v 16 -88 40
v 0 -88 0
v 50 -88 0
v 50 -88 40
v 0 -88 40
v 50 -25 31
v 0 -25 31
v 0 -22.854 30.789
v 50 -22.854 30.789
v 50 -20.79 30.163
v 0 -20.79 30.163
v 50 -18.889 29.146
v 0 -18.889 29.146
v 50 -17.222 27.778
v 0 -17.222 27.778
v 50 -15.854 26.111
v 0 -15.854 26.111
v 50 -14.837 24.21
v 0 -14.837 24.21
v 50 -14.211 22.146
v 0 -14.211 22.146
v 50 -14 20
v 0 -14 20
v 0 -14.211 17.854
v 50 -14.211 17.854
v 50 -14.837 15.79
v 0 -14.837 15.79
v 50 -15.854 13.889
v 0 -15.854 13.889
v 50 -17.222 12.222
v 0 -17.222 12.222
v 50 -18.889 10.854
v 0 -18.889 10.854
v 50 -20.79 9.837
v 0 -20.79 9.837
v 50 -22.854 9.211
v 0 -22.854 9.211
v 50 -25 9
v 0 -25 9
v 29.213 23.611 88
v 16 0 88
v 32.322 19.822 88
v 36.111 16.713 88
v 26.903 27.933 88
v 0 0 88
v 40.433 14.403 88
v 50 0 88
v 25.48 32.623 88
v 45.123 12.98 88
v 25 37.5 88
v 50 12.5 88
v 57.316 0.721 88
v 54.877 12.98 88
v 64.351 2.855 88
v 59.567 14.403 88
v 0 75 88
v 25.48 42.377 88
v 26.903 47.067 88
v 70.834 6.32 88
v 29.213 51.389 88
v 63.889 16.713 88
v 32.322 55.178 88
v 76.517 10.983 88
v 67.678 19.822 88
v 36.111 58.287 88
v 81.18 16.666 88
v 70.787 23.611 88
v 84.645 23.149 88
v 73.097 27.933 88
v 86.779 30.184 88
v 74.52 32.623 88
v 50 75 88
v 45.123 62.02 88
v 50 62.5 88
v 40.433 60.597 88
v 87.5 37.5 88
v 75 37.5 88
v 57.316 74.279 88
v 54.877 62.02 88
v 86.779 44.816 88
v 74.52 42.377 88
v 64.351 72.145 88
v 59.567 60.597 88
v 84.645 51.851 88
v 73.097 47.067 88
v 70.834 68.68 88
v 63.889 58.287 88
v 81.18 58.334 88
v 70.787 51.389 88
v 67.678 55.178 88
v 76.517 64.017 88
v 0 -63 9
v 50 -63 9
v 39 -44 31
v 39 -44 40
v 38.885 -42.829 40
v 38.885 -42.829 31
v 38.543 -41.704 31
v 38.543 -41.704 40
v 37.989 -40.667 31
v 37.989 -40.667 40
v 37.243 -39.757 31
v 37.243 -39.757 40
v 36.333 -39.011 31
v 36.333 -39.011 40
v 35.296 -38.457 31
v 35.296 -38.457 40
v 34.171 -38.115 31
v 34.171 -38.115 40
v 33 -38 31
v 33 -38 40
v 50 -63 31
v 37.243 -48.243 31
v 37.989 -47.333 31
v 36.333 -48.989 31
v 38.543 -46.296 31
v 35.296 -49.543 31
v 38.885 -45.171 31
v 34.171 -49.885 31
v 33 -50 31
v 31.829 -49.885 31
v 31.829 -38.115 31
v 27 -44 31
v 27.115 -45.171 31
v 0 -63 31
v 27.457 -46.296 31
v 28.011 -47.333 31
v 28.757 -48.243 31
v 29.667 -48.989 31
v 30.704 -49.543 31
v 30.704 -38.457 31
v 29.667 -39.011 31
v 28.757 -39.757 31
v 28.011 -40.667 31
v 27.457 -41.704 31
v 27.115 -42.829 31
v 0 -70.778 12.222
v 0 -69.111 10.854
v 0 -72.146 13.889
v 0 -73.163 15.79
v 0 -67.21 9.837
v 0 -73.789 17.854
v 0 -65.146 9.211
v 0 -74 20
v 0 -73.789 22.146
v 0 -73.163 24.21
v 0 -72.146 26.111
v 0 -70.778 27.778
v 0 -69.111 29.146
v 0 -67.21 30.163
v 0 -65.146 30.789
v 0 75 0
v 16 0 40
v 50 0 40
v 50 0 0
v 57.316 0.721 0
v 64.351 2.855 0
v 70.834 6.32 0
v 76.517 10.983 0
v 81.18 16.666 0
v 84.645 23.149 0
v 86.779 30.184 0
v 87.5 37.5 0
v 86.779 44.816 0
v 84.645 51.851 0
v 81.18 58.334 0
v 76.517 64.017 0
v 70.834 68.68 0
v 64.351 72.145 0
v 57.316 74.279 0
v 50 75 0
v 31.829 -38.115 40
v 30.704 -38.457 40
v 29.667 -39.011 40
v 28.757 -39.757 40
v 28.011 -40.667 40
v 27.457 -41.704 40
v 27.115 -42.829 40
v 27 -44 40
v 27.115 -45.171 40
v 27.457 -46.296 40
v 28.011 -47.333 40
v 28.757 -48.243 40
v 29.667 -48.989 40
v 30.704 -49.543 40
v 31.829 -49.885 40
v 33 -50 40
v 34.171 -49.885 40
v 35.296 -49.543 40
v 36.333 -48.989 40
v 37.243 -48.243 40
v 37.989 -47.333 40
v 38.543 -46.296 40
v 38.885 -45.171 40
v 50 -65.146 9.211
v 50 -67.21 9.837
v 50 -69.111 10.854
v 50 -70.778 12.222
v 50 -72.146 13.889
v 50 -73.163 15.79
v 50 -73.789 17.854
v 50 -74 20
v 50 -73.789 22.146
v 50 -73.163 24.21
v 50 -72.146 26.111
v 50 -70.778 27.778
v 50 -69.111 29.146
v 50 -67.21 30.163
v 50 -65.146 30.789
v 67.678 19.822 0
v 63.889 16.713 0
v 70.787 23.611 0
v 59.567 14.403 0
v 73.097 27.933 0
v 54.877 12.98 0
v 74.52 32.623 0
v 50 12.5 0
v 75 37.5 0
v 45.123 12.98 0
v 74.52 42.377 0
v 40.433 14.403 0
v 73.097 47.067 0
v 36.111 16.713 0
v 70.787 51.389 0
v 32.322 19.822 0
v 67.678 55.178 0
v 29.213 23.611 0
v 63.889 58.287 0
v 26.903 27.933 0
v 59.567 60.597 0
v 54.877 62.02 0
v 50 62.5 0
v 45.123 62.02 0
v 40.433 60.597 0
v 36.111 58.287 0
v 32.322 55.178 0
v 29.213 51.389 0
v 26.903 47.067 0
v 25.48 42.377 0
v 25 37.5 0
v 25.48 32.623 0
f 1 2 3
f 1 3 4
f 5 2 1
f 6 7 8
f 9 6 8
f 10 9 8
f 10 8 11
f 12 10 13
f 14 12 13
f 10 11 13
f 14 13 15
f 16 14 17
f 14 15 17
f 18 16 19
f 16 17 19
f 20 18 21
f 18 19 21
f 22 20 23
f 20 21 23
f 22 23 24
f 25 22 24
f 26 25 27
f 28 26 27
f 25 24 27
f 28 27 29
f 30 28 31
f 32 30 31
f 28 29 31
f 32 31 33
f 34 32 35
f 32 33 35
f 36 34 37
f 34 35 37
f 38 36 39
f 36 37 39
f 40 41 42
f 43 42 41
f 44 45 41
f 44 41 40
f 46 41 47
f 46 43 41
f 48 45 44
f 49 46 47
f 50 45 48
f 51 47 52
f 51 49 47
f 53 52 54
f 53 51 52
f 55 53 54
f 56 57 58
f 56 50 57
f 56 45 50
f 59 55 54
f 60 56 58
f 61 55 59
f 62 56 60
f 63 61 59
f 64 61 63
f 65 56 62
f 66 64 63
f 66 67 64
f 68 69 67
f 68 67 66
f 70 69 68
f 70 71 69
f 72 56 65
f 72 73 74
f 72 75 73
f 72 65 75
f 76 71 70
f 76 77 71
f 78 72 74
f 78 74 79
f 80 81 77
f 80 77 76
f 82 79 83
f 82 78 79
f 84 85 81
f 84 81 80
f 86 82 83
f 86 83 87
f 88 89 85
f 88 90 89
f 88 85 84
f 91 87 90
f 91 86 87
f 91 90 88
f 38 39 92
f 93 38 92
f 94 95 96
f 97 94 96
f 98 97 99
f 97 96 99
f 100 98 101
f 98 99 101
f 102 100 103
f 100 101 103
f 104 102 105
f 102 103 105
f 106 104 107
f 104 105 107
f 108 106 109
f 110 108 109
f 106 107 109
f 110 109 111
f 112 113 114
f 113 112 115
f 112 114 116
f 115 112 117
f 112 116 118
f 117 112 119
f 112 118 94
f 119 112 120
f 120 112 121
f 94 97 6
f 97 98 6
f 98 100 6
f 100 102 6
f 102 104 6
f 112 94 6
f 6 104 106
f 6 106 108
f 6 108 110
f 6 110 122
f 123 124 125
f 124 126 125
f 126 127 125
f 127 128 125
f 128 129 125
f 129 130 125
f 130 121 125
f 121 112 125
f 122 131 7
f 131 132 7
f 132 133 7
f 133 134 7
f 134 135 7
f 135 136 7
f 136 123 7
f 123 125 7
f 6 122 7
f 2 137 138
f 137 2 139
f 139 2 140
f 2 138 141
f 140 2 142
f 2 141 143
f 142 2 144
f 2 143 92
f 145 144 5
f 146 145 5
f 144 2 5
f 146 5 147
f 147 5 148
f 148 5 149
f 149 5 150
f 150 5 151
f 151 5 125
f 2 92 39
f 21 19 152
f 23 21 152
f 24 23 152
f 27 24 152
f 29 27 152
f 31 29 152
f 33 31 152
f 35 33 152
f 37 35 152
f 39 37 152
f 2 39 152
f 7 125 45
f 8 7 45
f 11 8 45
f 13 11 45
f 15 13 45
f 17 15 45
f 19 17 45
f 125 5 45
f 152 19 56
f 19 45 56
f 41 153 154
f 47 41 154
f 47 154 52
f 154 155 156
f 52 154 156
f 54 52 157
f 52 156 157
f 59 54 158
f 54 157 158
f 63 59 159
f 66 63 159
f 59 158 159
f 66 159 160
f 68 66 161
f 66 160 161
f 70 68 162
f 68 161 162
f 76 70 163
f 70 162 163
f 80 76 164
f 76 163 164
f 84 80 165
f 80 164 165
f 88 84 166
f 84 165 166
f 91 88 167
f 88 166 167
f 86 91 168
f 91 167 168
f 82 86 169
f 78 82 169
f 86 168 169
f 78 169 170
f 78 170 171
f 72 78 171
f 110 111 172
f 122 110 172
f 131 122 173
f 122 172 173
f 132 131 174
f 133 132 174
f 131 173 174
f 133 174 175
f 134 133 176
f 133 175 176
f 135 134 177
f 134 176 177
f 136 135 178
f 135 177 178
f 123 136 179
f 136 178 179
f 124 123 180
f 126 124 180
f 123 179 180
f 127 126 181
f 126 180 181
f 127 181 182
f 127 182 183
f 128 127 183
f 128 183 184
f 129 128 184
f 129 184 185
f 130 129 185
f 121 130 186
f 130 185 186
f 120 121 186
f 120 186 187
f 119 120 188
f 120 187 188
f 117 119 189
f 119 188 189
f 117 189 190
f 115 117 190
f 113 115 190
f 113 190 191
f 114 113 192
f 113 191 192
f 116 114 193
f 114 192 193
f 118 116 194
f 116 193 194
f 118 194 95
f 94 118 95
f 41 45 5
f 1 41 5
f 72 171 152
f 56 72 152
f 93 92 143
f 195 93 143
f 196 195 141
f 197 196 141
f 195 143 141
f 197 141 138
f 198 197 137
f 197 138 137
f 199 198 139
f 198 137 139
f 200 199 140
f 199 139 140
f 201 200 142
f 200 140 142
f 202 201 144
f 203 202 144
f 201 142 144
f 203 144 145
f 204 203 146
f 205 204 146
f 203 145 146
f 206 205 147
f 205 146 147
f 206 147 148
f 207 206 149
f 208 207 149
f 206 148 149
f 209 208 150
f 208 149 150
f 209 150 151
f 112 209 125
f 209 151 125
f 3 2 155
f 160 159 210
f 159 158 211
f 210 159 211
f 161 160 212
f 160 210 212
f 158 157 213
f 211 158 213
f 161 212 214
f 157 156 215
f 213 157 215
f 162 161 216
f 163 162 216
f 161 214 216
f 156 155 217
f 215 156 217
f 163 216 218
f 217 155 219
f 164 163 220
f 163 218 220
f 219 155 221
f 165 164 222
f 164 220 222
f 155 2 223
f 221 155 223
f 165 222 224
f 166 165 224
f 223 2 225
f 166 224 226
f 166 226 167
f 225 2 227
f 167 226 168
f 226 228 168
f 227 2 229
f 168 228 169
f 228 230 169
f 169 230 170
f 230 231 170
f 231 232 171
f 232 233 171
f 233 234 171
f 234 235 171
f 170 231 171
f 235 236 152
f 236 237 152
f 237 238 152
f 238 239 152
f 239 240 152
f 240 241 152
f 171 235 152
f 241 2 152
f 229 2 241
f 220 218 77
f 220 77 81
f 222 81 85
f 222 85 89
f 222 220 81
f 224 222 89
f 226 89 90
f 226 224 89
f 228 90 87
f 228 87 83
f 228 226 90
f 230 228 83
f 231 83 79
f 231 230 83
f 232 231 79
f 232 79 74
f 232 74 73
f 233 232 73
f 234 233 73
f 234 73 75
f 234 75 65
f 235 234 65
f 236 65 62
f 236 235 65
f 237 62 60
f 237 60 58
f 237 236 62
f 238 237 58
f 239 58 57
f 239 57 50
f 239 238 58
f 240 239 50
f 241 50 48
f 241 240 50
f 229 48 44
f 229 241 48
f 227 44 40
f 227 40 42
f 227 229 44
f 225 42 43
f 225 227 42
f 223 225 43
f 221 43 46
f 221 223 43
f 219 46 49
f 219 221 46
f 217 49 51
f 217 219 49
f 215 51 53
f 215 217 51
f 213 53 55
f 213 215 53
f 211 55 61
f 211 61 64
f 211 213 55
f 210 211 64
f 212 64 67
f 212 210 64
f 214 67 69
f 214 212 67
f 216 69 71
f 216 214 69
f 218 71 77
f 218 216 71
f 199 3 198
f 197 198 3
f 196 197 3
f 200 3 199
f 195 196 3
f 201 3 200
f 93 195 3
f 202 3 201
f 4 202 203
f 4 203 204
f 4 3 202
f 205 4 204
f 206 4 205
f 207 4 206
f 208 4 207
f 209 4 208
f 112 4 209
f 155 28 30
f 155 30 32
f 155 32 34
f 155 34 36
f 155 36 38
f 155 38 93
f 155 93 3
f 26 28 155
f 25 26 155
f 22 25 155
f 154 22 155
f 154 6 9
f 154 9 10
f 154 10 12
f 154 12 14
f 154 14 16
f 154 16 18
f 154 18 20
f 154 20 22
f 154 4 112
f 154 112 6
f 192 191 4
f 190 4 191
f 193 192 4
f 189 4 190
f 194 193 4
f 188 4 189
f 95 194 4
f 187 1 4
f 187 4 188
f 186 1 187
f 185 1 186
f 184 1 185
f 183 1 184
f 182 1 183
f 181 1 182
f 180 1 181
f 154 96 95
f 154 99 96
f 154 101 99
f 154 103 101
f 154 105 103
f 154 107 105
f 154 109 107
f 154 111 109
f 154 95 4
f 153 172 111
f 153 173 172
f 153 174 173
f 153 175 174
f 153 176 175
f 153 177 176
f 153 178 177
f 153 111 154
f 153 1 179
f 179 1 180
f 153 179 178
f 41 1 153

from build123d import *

# Parameters (mm, degrees)
F0_R     = 25
F1_DEPTH = 88
F2_W     = 88
F2_H     = 40
F3_DEPTH = 50
F5_DEPTH = 16
F7_DEPTH = 9


with BuildPart() as f1:
    # F0 (on Top) → F1 (new body)
    with BuildSketch(Plane.XY):
        with BuildLine():
            Line((0, 75), (0, 0))
            Line((0, 0), (50, 0))
            ThreePointArc((50, 0), (87.5, 37.5), (50, 75))
            Line((50, 75), (0, 75))
        make_face()
        with Locations((50, 37.5)):
            Circle(F0_R, mode=Mode.SUBTRACT)
    extrude(amount=F1_DEPTH)

    # F2 (on Right) → F3 (join)
    with BuildSketch(Plane.YZ):
        with Locations((-44, 20)):
            Rectangle(F2_W, F2_H)
        with BuildLine():
            ThreePointArc((-14, 20), (-17.2218254069, 12.2218254069), (-25, 9))
            Line((-25, 9), (-63, 9))
            ThreePointArc((-63, 9), (-74, 20), (-63, 31))
            Line((-63, 31), (-25, 31))
            ThreePointArc((-25, 31), (-17.2218254069, 27.7781745931), (-14, 20))
        make_face(mode=Mode.SUBTRACT)
    extrude(amount=F3_DEPTH)

    # F4 (on Right) → F5 (join)
    with BuildSketch(Plane.YZ):
        Polygon((-88, 40), (0, 40), (0, 88), align=None)
    extrude(amount=F5_DEPTH)

    # F6 (on face) → F7 (cut, through all)
    with BuildSketch(Plane.XY.offset(40)):
        with BuildLine():
            ThreePointArc((33, -38), (28.7573593129, -48.2426406871), (39, -44))
            ThreePointArc((39, -44), (37.2426406871, -39.7573593129), (33, -38))
        make_face()
    extrude(amount=-F7_DEPTH, mode=Mode.SUBTRACT)


solid = f1.part
